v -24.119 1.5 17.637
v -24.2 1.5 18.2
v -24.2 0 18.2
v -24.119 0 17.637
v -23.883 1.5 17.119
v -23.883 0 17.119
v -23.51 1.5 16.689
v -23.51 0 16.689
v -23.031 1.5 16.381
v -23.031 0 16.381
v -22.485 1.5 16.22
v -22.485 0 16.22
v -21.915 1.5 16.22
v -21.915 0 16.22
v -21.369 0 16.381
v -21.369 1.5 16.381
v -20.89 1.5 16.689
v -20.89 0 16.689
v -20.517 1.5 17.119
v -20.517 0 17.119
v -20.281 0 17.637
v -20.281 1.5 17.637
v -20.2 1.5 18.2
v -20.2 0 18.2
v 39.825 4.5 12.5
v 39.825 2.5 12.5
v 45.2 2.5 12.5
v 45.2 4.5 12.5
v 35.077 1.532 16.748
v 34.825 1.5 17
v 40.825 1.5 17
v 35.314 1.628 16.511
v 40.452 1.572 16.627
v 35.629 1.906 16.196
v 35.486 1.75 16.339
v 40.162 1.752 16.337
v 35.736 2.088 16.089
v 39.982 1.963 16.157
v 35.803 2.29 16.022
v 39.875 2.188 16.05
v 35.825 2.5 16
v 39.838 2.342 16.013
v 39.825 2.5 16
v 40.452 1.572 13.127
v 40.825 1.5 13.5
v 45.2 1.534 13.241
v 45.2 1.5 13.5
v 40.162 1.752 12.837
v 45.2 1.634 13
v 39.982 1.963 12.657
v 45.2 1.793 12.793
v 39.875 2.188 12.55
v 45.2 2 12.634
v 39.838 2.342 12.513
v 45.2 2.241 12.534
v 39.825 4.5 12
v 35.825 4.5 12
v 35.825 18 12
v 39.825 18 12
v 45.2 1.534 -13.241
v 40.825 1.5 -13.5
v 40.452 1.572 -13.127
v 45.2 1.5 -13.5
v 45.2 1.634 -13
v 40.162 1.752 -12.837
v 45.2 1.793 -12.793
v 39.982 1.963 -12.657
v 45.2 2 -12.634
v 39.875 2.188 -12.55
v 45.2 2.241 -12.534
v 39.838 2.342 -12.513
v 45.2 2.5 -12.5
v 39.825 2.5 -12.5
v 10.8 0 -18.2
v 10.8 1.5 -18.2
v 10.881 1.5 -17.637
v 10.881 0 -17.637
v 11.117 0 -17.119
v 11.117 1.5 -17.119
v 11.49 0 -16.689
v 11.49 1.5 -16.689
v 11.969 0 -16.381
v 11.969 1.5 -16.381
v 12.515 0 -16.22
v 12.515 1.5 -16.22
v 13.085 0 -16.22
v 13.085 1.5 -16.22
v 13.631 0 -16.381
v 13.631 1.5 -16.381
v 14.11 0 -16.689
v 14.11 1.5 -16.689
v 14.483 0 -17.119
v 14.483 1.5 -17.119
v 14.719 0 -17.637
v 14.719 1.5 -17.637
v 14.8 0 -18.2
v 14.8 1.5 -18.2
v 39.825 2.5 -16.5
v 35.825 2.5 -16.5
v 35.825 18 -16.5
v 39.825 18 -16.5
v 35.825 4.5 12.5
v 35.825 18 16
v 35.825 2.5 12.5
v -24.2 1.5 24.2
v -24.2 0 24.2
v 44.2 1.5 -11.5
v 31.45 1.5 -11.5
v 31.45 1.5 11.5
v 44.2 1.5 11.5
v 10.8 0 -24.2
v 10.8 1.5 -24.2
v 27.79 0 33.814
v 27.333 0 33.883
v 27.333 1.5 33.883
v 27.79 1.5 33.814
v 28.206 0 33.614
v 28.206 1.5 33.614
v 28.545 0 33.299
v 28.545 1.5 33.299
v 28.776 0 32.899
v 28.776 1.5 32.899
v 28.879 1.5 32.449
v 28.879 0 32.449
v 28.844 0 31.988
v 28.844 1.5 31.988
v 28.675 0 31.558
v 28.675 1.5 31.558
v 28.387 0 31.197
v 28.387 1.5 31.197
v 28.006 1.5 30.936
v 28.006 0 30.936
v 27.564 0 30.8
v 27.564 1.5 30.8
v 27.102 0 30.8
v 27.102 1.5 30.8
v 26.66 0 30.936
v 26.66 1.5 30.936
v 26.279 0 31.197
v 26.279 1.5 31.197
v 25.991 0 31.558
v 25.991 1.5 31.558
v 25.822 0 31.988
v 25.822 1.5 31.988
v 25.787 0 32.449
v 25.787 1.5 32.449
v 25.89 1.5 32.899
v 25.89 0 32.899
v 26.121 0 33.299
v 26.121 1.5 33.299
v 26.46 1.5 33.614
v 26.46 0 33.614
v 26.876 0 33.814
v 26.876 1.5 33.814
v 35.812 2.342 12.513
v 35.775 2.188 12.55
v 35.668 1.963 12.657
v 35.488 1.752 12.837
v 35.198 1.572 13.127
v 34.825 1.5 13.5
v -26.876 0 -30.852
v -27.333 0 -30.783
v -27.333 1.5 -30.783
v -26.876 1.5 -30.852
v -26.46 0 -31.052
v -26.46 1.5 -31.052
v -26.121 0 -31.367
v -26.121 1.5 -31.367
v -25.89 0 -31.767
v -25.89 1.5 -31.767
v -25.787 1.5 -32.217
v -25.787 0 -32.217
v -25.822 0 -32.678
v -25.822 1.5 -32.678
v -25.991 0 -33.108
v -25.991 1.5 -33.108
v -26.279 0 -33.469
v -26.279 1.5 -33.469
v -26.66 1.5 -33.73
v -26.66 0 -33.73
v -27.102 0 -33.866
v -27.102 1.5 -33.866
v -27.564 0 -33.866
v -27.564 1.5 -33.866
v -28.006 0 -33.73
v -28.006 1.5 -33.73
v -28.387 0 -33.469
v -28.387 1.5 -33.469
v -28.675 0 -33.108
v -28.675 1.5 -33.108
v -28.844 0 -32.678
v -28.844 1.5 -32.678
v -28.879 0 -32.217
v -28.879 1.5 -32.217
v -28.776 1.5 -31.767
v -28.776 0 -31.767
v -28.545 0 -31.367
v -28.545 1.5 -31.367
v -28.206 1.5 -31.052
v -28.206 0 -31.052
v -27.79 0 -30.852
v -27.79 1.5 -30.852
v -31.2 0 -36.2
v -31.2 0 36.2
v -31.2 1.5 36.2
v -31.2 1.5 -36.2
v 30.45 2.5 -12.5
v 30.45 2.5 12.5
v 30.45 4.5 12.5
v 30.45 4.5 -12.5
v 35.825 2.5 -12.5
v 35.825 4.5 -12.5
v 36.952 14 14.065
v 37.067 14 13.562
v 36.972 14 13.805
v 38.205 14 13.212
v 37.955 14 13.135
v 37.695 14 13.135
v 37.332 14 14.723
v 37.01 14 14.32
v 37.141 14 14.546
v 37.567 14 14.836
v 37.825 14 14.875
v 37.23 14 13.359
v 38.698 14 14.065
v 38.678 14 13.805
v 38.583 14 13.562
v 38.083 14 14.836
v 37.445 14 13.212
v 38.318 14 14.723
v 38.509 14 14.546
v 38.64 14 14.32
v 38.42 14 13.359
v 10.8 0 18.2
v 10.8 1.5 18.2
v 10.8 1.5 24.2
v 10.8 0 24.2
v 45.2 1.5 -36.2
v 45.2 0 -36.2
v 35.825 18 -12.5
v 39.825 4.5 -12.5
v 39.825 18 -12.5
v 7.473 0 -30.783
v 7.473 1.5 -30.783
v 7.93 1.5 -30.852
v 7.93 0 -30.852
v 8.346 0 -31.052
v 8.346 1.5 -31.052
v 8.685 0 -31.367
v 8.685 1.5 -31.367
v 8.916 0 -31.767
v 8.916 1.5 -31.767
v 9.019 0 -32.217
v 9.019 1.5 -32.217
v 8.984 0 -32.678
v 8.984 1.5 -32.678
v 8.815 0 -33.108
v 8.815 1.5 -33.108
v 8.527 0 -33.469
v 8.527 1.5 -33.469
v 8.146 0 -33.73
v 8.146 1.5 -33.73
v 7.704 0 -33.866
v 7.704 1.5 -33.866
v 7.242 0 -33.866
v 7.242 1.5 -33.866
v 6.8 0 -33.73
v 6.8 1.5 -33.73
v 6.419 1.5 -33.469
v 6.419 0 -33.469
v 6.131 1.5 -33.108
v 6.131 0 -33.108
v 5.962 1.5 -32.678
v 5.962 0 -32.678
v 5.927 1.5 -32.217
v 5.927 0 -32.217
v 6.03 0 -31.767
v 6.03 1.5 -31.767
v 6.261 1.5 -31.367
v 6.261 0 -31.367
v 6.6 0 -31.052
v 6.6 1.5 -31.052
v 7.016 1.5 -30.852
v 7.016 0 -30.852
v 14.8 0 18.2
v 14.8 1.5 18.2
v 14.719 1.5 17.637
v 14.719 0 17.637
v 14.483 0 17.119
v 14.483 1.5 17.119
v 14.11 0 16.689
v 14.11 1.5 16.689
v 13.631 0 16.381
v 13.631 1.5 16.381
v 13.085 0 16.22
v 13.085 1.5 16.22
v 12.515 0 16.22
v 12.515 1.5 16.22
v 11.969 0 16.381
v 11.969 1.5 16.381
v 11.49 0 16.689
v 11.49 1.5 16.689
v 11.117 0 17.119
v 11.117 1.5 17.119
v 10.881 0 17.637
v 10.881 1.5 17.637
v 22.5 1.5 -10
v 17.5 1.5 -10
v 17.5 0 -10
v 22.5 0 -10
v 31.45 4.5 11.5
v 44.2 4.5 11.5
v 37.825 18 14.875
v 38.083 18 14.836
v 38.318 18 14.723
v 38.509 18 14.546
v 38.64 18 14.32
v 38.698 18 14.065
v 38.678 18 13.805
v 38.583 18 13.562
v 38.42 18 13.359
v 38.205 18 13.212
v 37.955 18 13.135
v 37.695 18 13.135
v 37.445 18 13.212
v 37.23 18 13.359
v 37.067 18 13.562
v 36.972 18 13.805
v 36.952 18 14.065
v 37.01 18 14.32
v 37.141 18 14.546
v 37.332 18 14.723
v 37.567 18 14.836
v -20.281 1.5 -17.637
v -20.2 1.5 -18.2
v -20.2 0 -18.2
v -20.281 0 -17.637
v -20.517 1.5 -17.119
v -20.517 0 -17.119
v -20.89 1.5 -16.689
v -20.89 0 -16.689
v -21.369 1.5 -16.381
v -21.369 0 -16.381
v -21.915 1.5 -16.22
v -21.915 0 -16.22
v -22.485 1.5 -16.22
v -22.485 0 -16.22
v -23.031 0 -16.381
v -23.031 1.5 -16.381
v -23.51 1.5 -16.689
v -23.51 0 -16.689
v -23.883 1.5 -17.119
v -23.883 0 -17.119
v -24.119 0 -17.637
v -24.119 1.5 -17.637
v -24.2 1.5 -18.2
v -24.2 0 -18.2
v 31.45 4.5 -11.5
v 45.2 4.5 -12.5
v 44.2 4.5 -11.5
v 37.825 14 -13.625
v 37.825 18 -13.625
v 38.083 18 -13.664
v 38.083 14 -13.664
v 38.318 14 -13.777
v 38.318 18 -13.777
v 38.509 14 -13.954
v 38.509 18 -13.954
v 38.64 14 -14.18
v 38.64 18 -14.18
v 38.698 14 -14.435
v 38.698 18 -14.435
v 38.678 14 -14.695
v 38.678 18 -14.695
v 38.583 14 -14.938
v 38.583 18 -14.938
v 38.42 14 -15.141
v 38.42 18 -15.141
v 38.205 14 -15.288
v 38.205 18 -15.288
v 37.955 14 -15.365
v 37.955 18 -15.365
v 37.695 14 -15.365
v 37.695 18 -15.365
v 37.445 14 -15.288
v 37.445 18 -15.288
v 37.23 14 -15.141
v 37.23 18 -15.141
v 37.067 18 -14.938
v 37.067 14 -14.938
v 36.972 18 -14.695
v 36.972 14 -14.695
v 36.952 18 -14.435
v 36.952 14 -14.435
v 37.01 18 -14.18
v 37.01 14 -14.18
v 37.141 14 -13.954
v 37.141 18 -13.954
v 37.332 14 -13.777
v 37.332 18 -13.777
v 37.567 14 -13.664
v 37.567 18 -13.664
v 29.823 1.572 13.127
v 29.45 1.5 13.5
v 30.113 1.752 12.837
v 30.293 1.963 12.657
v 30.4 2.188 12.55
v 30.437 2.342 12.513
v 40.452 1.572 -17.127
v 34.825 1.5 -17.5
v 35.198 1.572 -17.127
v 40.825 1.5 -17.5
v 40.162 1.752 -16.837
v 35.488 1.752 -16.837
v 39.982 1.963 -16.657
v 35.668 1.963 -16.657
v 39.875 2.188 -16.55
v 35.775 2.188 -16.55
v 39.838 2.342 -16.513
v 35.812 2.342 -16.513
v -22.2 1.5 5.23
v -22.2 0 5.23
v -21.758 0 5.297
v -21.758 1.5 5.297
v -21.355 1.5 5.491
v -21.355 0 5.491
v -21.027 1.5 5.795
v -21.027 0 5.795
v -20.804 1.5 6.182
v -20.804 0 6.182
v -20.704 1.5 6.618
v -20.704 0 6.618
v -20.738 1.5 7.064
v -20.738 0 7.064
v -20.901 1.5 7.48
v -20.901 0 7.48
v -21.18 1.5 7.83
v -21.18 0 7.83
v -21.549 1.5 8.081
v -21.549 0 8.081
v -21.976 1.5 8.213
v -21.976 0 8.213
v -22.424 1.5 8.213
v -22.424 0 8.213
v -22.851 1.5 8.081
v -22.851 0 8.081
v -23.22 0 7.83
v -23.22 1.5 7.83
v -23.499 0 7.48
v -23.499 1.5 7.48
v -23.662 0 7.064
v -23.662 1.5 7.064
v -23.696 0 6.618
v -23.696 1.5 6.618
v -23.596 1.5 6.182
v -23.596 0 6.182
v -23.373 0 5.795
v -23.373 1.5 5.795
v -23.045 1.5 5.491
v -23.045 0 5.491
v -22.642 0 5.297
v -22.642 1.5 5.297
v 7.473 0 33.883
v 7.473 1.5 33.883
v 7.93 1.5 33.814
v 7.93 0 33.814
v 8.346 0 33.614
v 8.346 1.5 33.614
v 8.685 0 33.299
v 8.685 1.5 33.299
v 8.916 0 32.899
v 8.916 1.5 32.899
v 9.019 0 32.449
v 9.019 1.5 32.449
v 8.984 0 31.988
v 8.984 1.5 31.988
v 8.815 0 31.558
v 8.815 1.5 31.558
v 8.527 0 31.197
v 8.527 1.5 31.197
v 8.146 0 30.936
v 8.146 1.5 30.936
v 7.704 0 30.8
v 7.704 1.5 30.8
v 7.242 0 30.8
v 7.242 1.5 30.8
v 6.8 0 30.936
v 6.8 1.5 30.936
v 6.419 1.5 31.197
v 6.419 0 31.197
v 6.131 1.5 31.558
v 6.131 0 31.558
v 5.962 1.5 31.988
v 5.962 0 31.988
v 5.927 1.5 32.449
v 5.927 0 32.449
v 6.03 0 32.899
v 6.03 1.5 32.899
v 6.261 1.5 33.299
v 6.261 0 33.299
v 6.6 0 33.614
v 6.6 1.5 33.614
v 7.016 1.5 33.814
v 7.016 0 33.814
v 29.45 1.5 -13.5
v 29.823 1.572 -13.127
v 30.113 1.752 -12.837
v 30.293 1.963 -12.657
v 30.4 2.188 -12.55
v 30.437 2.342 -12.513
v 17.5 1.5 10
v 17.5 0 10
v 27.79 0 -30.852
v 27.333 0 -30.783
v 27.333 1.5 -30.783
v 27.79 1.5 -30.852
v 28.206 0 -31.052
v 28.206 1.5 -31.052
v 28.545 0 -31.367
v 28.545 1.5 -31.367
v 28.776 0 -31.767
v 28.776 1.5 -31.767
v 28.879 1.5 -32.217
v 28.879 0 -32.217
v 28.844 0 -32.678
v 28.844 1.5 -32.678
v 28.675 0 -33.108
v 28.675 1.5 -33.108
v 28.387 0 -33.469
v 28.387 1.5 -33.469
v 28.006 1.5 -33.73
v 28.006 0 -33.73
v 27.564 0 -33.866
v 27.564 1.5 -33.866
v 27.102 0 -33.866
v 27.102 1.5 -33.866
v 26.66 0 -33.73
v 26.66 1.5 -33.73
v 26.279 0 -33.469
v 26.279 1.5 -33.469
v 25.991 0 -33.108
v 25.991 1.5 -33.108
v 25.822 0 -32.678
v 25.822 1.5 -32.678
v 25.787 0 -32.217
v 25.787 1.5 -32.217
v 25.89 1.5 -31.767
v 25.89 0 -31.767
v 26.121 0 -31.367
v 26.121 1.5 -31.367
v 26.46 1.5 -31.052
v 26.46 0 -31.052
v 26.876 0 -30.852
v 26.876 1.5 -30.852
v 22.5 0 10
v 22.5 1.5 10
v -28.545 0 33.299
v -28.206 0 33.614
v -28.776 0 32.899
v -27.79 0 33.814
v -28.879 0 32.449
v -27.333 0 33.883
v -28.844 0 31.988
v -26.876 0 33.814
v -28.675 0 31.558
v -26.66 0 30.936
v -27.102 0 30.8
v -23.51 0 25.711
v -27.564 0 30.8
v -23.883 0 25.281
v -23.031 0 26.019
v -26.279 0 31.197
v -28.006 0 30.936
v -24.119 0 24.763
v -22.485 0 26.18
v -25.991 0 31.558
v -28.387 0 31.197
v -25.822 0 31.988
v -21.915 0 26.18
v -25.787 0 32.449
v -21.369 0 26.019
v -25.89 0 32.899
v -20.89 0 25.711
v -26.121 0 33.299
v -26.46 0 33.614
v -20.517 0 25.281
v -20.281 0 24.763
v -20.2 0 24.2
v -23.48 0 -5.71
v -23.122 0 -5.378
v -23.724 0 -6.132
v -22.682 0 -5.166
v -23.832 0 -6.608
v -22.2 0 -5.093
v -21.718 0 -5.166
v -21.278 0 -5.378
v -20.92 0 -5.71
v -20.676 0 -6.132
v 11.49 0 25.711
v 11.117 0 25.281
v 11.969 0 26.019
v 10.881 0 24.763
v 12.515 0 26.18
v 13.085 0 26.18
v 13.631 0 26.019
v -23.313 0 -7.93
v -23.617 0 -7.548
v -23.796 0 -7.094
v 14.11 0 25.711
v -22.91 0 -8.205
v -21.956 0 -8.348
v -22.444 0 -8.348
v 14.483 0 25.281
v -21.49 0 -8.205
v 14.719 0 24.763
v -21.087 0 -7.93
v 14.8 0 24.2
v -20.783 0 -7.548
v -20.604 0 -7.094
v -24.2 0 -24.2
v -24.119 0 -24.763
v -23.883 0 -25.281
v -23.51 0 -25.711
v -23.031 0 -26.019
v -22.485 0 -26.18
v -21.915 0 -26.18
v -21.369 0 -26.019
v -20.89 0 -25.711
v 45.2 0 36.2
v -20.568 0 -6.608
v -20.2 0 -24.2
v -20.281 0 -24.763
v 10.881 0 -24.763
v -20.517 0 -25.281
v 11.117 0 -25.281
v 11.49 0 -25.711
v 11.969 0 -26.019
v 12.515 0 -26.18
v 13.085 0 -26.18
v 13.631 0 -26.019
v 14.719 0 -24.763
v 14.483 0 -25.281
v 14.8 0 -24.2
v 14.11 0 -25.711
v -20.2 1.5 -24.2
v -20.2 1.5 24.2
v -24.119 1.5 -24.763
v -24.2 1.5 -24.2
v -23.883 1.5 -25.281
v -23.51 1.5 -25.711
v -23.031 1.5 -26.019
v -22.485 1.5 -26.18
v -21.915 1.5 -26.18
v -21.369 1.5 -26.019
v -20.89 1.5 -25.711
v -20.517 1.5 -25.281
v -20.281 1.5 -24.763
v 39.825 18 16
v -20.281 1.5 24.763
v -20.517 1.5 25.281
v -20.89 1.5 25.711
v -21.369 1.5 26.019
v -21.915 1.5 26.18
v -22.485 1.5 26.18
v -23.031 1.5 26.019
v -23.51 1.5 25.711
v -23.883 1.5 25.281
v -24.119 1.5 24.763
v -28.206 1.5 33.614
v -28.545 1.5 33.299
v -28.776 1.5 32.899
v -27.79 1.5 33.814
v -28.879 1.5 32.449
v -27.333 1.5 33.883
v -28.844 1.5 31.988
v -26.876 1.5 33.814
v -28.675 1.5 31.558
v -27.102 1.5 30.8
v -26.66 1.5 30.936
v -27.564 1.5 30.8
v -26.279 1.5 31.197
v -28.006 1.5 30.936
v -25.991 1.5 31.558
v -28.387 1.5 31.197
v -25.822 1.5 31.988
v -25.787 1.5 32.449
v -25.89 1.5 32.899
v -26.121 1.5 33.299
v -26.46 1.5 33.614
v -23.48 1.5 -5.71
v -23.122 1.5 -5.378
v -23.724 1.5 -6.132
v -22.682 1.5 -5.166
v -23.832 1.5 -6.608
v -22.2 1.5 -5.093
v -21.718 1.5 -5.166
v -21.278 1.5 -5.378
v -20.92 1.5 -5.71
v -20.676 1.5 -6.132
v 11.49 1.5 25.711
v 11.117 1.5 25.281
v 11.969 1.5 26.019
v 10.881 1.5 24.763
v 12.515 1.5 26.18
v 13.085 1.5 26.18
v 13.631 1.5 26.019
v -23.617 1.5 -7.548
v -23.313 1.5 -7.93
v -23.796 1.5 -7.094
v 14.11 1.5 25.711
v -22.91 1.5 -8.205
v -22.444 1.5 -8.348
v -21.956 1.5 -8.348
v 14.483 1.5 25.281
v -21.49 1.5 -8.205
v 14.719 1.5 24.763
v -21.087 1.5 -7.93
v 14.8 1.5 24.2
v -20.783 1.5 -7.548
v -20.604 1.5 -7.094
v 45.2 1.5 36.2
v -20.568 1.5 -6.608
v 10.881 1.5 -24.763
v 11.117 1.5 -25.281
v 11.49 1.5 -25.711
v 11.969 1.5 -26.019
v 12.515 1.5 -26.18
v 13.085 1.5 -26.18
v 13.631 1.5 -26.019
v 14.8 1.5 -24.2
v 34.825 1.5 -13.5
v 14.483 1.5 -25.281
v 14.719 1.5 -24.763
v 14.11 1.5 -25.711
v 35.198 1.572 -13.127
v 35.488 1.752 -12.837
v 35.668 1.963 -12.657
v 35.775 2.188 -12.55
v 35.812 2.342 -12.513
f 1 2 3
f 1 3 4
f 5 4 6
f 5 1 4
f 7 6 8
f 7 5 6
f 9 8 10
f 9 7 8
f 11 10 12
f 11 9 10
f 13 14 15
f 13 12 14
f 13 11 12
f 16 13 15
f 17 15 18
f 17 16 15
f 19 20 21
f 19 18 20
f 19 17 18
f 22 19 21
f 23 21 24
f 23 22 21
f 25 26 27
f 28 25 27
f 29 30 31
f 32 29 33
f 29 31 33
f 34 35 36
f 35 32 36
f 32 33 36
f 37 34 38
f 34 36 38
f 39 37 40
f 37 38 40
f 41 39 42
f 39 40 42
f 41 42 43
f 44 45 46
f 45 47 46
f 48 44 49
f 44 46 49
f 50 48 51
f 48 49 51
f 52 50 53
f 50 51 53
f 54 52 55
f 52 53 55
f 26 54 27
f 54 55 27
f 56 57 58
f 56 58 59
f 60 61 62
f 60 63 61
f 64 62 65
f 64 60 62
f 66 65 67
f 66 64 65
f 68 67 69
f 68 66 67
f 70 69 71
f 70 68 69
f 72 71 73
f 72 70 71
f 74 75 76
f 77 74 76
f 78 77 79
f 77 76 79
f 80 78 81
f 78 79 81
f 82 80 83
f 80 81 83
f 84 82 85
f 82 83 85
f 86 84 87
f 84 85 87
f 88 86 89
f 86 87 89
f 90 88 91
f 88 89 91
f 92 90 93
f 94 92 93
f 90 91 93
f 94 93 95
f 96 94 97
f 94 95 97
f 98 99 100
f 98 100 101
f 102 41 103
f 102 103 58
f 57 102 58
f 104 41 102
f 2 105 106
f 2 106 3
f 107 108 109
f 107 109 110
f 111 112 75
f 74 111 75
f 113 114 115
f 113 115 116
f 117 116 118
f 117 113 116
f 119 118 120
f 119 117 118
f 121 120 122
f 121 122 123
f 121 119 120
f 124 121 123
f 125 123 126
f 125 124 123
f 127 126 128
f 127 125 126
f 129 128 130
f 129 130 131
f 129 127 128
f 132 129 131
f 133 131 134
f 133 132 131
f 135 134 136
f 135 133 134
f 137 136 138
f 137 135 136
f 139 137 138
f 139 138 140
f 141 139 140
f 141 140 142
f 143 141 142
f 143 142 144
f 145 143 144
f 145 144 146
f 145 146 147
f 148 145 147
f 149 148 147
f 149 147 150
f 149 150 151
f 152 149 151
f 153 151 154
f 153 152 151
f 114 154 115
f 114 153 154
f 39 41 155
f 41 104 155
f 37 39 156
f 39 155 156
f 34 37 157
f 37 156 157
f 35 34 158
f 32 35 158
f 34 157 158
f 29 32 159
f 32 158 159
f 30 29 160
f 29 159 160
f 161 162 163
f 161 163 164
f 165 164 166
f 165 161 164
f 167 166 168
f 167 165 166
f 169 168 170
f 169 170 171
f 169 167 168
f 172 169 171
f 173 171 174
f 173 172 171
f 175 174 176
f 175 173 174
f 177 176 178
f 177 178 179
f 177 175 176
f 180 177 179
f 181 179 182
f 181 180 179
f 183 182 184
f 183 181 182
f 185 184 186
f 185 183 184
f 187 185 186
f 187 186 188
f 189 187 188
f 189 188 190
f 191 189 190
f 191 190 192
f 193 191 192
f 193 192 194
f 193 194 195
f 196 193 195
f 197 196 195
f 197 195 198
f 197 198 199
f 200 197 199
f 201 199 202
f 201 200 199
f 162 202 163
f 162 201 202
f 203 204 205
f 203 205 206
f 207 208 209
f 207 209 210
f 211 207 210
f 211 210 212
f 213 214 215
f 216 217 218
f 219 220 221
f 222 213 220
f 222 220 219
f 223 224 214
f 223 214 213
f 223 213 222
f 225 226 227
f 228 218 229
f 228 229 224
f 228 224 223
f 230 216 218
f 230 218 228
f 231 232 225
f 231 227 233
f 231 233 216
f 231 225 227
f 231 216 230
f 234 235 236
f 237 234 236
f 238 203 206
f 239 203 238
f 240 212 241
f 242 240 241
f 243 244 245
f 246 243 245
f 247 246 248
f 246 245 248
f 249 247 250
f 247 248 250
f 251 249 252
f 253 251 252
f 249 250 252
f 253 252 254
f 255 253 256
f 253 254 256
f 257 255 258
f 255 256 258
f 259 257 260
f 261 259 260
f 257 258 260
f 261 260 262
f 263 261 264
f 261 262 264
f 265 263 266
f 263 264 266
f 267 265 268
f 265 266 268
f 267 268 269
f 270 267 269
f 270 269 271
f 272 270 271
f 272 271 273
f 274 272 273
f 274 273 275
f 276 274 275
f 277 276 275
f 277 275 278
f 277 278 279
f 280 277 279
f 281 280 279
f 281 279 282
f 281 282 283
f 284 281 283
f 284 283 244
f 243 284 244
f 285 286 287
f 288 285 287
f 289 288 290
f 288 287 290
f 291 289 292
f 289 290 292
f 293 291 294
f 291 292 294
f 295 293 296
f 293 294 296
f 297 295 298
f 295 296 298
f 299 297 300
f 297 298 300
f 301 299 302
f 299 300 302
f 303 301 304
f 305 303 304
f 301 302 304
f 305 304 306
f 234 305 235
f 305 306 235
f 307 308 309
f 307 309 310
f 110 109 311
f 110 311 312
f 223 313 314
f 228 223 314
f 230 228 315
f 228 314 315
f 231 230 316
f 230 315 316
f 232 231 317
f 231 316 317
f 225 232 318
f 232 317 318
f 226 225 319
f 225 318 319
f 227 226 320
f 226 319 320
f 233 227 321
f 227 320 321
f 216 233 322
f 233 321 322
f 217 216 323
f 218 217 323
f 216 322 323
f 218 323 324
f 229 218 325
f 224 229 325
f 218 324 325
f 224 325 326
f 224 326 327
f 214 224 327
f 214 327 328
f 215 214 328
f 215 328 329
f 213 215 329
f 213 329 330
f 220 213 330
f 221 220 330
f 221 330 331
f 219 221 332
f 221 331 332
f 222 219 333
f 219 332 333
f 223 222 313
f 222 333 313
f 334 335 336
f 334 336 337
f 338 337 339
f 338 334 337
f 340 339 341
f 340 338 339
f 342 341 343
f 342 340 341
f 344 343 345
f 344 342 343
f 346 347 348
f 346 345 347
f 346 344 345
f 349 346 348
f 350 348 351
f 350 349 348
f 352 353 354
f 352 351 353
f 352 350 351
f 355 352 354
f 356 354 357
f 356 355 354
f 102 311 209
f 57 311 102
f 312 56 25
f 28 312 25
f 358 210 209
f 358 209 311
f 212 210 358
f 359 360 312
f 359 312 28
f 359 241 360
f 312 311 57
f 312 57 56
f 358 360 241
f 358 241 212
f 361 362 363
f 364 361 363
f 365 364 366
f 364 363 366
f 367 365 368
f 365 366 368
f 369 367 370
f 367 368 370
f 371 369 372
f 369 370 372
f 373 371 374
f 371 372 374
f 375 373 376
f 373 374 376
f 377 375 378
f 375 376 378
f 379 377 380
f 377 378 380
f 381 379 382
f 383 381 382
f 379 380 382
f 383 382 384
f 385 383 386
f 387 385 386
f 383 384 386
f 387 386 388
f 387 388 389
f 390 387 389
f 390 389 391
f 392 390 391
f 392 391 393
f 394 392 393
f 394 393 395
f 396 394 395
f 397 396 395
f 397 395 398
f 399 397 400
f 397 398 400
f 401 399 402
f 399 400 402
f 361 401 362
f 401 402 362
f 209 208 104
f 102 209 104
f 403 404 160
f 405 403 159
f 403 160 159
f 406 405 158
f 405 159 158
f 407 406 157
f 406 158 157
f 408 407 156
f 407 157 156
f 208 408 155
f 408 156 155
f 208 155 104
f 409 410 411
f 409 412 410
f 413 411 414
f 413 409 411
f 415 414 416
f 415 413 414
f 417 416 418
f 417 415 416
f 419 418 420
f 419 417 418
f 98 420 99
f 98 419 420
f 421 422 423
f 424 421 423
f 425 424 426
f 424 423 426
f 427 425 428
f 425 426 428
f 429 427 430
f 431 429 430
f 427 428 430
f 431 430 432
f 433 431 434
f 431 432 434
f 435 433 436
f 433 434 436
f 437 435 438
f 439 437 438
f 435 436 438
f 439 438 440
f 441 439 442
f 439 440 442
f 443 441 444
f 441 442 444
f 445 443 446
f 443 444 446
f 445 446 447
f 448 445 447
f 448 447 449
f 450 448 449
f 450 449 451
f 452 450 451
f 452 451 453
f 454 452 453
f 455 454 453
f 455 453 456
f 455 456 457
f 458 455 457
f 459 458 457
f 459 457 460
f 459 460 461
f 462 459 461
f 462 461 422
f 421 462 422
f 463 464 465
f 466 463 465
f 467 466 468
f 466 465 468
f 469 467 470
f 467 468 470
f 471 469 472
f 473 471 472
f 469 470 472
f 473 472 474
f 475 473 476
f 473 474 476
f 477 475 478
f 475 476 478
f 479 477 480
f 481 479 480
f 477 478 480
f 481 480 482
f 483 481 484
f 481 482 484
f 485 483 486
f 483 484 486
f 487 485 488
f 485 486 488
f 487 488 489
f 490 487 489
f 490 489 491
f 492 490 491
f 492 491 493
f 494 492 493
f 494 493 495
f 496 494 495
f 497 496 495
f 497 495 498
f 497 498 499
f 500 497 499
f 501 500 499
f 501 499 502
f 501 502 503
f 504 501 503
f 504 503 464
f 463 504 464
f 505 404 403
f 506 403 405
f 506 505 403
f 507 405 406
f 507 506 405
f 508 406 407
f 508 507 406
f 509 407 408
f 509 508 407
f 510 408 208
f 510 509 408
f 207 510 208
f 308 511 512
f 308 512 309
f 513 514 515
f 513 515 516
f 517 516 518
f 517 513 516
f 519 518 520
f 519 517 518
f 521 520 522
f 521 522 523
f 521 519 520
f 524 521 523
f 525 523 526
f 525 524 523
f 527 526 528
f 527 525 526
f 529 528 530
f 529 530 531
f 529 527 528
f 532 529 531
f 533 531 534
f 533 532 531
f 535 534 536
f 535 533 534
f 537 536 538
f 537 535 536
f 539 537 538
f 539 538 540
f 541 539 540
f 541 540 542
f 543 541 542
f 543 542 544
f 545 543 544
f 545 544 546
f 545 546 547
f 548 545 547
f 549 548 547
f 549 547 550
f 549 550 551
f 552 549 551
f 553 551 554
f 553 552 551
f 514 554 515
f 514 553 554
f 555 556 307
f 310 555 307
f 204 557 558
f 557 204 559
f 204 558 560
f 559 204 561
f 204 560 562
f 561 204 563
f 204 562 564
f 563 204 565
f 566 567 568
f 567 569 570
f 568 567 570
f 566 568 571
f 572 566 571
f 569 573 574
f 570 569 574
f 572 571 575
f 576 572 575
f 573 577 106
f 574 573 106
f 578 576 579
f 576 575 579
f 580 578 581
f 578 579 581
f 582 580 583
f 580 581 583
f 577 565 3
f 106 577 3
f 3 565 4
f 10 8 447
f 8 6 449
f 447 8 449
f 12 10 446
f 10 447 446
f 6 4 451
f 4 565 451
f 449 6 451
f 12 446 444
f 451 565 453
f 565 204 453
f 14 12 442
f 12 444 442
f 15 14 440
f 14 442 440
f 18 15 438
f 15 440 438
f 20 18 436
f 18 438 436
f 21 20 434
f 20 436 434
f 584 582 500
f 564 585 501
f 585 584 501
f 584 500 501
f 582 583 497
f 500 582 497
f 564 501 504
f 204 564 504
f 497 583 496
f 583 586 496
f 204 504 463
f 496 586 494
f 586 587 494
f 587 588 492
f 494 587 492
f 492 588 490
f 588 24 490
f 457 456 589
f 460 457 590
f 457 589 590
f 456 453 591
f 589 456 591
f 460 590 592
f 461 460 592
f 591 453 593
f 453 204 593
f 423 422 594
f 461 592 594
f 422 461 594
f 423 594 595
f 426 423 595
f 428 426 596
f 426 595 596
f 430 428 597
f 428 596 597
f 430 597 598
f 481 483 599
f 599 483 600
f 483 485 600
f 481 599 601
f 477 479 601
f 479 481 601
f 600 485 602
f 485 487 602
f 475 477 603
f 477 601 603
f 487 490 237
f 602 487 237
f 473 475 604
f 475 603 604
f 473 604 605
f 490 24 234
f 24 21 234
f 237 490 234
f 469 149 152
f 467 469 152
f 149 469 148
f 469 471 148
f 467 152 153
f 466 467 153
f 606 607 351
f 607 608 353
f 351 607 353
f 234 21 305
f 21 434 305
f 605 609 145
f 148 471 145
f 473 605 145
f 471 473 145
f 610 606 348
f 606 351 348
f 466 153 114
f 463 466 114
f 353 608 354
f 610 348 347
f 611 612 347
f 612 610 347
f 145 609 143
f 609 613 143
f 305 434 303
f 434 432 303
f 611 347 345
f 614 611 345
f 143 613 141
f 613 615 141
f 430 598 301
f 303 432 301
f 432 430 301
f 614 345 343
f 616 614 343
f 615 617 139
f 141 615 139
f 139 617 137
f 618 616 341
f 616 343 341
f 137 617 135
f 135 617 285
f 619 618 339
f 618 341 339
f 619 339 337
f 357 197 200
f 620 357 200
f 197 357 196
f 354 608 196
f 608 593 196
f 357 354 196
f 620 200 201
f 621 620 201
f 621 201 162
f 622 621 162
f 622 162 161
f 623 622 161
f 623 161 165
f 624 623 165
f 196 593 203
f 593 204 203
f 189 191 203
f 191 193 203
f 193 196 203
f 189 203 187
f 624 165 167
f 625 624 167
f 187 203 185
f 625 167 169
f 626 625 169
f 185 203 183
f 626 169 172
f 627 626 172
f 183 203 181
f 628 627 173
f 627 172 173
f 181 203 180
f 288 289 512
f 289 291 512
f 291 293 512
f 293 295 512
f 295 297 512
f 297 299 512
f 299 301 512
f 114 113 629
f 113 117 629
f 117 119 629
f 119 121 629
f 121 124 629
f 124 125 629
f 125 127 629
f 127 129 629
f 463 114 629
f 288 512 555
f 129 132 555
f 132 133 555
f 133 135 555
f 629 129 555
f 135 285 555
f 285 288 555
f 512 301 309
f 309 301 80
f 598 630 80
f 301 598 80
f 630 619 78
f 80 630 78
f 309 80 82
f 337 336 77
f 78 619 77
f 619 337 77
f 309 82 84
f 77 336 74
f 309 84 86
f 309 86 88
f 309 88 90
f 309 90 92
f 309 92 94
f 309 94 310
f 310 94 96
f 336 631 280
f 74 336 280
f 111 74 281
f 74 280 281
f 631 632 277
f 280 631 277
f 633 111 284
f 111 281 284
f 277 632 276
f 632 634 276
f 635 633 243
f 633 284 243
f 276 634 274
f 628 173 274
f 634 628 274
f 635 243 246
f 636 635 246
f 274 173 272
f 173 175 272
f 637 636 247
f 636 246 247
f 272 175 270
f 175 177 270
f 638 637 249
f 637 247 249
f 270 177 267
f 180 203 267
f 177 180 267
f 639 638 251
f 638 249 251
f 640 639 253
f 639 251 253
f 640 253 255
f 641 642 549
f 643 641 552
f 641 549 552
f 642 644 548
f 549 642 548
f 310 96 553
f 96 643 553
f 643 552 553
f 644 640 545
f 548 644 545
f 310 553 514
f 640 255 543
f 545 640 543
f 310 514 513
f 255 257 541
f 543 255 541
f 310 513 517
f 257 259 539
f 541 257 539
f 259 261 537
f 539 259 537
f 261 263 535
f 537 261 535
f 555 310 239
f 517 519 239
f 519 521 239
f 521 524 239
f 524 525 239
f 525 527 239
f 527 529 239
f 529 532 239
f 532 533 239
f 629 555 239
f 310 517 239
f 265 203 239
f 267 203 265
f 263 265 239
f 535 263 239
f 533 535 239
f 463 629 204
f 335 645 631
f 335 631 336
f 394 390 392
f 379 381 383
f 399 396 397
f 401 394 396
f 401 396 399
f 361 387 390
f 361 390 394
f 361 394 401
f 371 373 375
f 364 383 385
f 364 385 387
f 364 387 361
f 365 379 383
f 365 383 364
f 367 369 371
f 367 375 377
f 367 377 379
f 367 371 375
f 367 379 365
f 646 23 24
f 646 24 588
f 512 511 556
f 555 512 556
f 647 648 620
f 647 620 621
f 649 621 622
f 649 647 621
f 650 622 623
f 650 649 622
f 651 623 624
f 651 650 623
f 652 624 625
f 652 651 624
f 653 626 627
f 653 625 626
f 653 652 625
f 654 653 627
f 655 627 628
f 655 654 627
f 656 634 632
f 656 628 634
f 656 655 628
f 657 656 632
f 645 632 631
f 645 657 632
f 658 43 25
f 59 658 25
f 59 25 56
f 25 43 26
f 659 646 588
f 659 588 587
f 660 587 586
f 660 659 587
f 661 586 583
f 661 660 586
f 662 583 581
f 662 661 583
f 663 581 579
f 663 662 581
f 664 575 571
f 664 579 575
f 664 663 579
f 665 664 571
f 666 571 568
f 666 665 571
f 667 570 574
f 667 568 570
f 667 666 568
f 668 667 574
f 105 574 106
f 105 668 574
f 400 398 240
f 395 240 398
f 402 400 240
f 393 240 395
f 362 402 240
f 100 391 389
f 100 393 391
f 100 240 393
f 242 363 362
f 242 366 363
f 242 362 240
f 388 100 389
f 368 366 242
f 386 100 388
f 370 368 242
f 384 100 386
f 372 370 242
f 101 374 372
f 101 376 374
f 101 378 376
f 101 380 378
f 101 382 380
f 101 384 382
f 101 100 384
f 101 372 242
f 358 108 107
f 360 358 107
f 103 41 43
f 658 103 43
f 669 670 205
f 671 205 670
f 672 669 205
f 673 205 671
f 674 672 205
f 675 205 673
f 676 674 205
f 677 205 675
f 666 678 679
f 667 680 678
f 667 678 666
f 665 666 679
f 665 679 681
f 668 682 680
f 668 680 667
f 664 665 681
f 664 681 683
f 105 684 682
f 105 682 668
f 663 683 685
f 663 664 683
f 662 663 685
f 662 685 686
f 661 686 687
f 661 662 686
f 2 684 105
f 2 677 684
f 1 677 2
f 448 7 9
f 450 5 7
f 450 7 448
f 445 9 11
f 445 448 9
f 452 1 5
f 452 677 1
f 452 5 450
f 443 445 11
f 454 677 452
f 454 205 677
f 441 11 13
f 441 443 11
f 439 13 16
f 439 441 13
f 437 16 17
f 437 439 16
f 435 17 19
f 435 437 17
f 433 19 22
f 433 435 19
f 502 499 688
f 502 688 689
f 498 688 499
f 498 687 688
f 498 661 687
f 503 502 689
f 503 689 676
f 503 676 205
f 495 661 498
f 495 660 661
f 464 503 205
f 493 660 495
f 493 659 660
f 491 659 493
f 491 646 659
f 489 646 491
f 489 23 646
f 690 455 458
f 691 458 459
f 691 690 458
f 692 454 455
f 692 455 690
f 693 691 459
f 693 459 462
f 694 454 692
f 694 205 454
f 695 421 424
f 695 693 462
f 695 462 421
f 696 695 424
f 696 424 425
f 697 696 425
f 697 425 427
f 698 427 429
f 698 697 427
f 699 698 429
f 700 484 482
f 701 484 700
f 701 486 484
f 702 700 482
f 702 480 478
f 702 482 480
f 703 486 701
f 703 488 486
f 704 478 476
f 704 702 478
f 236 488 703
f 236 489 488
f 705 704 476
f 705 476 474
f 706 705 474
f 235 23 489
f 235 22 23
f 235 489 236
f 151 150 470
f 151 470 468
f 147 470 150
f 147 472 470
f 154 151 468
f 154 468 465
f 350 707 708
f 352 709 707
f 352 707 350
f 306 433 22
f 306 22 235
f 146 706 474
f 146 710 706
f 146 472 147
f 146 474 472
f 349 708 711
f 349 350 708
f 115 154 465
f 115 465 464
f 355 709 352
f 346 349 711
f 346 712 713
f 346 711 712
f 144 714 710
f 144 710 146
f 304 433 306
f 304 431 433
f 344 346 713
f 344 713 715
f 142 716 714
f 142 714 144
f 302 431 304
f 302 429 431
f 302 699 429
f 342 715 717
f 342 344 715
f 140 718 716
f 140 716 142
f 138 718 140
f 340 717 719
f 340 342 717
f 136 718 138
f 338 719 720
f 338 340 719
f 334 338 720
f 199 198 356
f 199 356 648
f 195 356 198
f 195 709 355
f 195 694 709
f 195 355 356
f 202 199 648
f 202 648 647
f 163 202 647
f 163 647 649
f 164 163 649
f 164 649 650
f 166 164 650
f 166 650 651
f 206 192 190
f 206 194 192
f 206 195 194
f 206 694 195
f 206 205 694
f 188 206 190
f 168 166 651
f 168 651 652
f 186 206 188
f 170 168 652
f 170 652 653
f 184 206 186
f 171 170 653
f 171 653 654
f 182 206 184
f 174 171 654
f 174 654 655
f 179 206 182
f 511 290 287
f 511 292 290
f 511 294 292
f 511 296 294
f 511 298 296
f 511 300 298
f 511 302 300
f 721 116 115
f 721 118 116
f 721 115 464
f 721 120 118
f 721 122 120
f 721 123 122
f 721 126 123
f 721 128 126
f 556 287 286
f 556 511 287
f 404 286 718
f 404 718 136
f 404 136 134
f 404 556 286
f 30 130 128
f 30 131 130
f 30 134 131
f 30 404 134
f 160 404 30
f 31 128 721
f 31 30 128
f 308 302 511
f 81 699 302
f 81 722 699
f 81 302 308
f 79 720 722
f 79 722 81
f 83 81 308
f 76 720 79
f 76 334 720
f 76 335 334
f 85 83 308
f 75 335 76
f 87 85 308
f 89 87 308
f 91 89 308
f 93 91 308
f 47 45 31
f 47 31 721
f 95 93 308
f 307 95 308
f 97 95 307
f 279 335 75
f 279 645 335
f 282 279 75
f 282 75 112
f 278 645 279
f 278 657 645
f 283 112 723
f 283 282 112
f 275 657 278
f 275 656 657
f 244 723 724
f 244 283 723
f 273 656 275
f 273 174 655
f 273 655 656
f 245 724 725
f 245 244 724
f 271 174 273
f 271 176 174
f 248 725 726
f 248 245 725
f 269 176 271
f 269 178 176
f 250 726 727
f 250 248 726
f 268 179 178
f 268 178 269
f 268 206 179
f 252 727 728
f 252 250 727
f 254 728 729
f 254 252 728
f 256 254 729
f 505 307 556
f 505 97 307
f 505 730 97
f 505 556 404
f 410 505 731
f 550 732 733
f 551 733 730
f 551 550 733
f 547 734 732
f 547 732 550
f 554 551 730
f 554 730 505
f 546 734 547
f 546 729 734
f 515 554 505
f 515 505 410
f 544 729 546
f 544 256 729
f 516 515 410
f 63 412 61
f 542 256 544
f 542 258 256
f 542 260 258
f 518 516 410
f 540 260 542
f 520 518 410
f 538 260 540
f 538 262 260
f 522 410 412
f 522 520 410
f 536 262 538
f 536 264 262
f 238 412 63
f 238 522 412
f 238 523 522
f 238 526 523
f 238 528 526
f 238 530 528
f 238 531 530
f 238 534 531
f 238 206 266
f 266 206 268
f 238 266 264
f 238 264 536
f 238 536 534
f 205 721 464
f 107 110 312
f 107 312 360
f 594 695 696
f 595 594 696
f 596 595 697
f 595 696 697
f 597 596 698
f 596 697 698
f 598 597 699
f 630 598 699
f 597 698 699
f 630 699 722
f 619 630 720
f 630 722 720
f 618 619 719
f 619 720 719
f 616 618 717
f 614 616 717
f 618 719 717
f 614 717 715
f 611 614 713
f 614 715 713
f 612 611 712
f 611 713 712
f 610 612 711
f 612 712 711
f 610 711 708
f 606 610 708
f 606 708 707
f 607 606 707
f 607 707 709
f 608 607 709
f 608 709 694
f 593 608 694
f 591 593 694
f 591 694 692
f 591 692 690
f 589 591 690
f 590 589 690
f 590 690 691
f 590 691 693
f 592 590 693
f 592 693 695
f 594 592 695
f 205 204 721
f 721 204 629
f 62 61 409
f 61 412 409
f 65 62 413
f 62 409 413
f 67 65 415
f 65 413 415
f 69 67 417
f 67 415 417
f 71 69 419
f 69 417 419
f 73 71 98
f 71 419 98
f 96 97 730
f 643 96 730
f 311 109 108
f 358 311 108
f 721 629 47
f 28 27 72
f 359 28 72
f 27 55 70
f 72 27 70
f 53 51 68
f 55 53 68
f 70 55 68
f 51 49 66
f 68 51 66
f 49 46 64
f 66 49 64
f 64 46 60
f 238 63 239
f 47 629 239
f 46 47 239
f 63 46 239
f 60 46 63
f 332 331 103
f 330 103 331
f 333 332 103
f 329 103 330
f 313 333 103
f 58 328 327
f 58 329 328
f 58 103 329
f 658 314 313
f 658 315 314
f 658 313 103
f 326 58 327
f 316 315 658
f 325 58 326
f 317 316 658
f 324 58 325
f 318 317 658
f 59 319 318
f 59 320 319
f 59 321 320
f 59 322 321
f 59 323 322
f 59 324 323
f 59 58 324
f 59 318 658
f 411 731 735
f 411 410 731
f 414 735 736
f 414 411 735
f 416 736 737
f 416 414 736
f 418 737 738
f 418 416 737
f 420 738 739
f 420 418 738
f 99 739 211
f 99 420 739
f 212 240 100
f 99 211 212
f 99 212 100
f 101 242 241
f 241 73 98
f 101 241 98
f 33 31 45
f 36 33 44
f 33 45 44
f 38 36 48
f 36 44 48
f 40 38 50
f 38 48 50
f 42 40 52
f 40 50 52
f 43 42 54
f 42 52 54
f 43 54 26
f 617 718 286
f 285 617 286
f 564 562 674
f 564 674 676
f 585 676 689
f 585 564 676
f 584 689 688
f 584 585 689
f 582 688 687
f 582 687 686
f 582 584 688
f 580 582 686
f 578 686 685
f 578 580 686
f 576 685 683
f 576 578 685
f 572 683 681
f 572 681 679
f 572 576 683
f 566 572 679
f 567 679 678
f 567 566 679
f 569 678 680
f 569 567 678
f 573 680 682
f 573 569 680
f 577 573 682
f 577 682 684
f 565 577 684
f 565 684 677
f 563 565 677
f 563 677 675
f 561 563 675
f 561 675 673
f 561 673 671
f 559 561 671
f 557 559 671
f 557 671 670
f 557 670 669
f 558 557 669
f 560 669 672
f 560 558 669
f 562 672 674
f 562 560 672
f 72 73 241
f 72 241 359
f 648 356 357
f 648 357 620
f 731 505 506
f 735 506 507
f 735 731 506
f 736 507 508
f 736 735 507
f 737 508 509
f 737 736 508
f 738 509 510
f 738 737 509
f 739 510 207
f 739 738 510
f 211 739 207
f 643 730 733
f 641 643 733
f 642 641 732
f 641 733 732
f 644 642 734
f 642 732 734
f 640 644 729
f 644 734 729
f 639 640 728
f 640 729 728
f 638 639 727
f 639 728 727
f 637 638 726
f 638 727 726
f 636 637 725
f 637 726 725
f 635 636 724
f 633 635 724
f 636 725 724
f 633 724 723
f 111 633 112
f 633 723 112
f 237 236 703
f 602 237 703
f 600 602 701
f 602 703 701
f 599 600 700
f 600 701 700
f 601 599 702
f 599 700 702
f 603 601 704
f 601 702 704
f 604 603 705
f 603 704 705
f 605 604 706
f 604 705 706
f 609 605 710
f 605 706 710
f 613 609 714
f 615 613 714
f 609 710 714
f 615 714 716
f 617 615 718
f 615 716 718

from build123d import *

# Parameters (mm, degrees)
SKETCH1_W           = 62.4
SKETCH1_H           = 72.4
SKETCH1_R           = 1.55
SKETCH1_W_2         = 14
BOSS_EXTRUDE1_DEPTH = 1.5
SKETCH3_W           = 14.75
SKETCH3_H           = 25
SKETCH3_W_2         = 12.75
SKETCH3_H_2         = 23
BOSS_EXTRUDE2_DEPTH = 3
SKETCH4_W           = 4
SKETCH4_H           = 4
BOSS_EXTRUDE3_DEPTH = 16.5
SKETCH5_R           = 0.875
CUT_EXTRUDE1_DEPTH  = 4
FILLET1_R           = 1
SKETCH6_R           = 1.55
CUT_EXTRUDE5_DEPTH  = 61.214034909
SKETCH7_W           = 5
SKETCH7_H           = 20
CUT_EXTRUDE3_DEPTH  = 61.214034909
SKETCH8_R           = 1.5
CUT_EXTRUDE4_DEPTH  = 61.64222951
SKETCH9_R           = 1.636711996
CUT_EXTRUDE6_DEPTH  = 61.214034909


with BuildPart() as part:
    # Sketch1 → Boss-Extrude1 (new body)
    # profile 1 of 2: a face of its own
    with BuildSketch(Plane(origin=(0, 0, 0), x_dir=(1, 0, 0), z_dir=(0, 1, 0))):
        Rectangle(SKETCH1_W, SKETCH1_H)
        with Locations(Location((-27.333, -32.333, 0), (0, 0, 270))):
            Circle(SKETCH1_R, mode=Mode.SUBTRACT)
        with Locations(Location((27.333, -32.333, 0), (0, 0, 270))):
            Circle(SKETCH1_R, mode=Mode.SUBTRACT)
        with Locations(Location((-27.333, 32.333, 0), (0, 0, 270))):
            Circle(SKETCH1_R, mode=Mode.SUBTRACT)
        with Locations(Location((27.333, 32.333, 0), (0, 0, 270))):
            Circle(SKETCH1_R, mode=Mode.SUBTRACT)
    # profile 2 of 2: a face of its own
    with BuildSketch(Plane(origin=(0, 0, 0), x_dir=(1, 0, 0), z_dir=(0, 1, 0))):
        with Locations((38.2, 0)):
            Rectangle(SKETCH1_W_2, SKETCH1_H)
    extrude(amount=BOSS_EXTRUDE1_DEPTH)

    # Sketch3 → Boss-Extrude2 (add)
    with BuildSketch(Plane(origin=(0, 1.5, 0), x_dir=(1, 0, 0), z_dir=(0, 1, 0))):
        with Locations((37.825, 0)):
            Rectangle(SKETCH3_W, SKETCH3_H)
        with Locations((37.825, 0)):
            Rectangle(SKETCH3_W_2, SKETCH3_H_2, mode=Mode.SUBTRACT)
    extrude(amount=BOSS_EXTRUDE2_DEPTH)

    # Sketch4 → Boss-Extrude3 (add)
    with BuildSketch(Plane(origin=(0, 1.5, 0), x_dir=(1, 0, 0), z_dir=(0, 1, 0))):
        with Locations((37.825, -14)):
            Rectangle(SKETCH4_W, SKETCH4_H)
        with Locations((37.825, 14.5)):
            Rectangle(SKETCH4_W, SKETCH4_H)
    extrude(amount=BOSS_EXTRUDE3_DEPTH)

    # Sketch5 → Cut-Extrude1 (cut)
    with BuildSketch(Plane(origin=(0, 18, 0), x_dir=(1, 0, 0), z_dir=(0, 1, 0))):
        with Locations(Location((37.825, -14, 0), (0, 0, 270))):
            Circle(SKETCH5_R)
        with Locations(Location((37.825, 14.5, 0), (0, 0, 270))):
            Circle(SKETCH5_R)
    extrude(amount=-CUT_EXTRUDE1_DEPTH, mode=Mode.SUBTRACT)

    # Fillet1
    fillet1_edges = [part.edges().sort_by_distance(p)[0] for p in [
        (42.5125, 1.5, -12.5),
        (30.45, 1.5, 0),
        (33.1375, 1.5, 12.5),
        (42.5125, 1.5, 12.5),
        (35.825, 1.5, 14.25),
        (39.825, 1.5, 14.25),
        (37.825, 1.5, 16),
        (33.1375, 1.5, -12.5),
        (35.825, 1.5, -14.5),
        (39.825, 1.5, -14.5),
        (37.825, 1.5, -16.5),
    ]]
    fillet(fillet1_edges, radius=FILLET1_R)

    # Sketch6 → Cut-Extrude5 (cut, through all)
    with BuildSketch(Plane(origin=(0, 1.5, 0), x_dir=(1, 0, 0), z_dir=(0, 1, 0))):
        with Locations(Location((7.473, -32.333, 0), (0, 0, 270))):
            Circle(SKETCH6_R)
        with Locations(Location((7.473, 32.333, 0), (0, 0, 270))):
            Circle(SKETCH6_R)
    extrude(amount=-CUT_EXTRUDE5_DEPTH, mode=Mode.SUBTRACT)

    # Sketch7 → Cut-Extrude3 (cut, through all)
    with BuildSketch(Plane(origin=(0, 1.5, 0), x_dir=(1, 0, 0), z_dir=(0, 1, 0))):
        with Locations((20, 0)):
            Rectangle(SKETCH7_W, SKETCH7_H)
    extrude(amount=-CUT_EXTRUDE3_DEPTH, mode=Mode.SUBTRACT)

    # Sketch8 → Cut-Extrude4 (cut, through all)
    with BuildSketch(Plane.XZ):
        with Locations(Location((-22.2, -6.73, 0), (0, 0, 270))):
            Circle(SKETCH8_R)
        with Locations(Location((-22.2, 6.73, 0), (0, 0, 270))):
            Circle(SKETCH8_R)
    extrude(amount=-CUT_EXTRUDE4_DEPTH, mode=Mode.SUBTRACT)

    # Sketch9 → Cut-Extrude6 (cut, through all)
    with BuildSketch(Plane(origin=(0, 1.5, 0), x_dir=(1, 0, 0), z_dir=(0, 1, 0))):
        with Locations(Location((-22.2, 6.73, 0), (0, 0, 270))):
            Circle(SKETCH9_R)
        with BuildLine():
            Line((-20.2, 24.2), (-20.2, 18.2))
            ThreePointArc((-20.2, 18.2), (-22.2, 16.2), (-24.2, 18.2))
            Line((-24.2, 18.2), (-24.2, 24.2))
            ThreePointArc((-24.2, 24.2), (-22.2, 26.2), (-20.2, 24.2))
        make_face()
        with BuildLine():
            Line((-20.2, -18.2), (-20.2, -24.2))
            ThreePointArc((-20.2, -24.2), (-22.2, -26.2), (-24.2, -24.2))
            Line((-24.2, -24.2), (-24.2, -18.2))
            ThreePointArc((-24.2, -18.2), (-22.2, -16.2), (-20.2, -18.2))
        make_face()
        with BuildLine():
            Line((10.8, 24.2), (10.8, 18.2))
            ThreePointArc((10.8, 18.2), (12.8, 16.2), (14.8, 18.2))
            Line((14.8, 18.2), (14.8, 24.2))
            ThreePointArc((14.8, 24.2), (12.8, 26.2), (10.8, 24.2))
        make_face()
        with BuildLine():
            Line((10.8, -18.2), (10.8, -24.2))
            ThreePointArc((10.8, -24.2), (12.8, -26.2), (14.8, -24.2))
            Line((14.8, -24.2), (14.8, -18.2))
            ThreePointArc((14.8, -18.2), (12.8, -16.2), (10.8, -18.2))
        make_face()
    extrude(amount=-CUT_EXTRUDE6_DEPTH, mode=Mode.SUBTRACT)


solid = part.part
